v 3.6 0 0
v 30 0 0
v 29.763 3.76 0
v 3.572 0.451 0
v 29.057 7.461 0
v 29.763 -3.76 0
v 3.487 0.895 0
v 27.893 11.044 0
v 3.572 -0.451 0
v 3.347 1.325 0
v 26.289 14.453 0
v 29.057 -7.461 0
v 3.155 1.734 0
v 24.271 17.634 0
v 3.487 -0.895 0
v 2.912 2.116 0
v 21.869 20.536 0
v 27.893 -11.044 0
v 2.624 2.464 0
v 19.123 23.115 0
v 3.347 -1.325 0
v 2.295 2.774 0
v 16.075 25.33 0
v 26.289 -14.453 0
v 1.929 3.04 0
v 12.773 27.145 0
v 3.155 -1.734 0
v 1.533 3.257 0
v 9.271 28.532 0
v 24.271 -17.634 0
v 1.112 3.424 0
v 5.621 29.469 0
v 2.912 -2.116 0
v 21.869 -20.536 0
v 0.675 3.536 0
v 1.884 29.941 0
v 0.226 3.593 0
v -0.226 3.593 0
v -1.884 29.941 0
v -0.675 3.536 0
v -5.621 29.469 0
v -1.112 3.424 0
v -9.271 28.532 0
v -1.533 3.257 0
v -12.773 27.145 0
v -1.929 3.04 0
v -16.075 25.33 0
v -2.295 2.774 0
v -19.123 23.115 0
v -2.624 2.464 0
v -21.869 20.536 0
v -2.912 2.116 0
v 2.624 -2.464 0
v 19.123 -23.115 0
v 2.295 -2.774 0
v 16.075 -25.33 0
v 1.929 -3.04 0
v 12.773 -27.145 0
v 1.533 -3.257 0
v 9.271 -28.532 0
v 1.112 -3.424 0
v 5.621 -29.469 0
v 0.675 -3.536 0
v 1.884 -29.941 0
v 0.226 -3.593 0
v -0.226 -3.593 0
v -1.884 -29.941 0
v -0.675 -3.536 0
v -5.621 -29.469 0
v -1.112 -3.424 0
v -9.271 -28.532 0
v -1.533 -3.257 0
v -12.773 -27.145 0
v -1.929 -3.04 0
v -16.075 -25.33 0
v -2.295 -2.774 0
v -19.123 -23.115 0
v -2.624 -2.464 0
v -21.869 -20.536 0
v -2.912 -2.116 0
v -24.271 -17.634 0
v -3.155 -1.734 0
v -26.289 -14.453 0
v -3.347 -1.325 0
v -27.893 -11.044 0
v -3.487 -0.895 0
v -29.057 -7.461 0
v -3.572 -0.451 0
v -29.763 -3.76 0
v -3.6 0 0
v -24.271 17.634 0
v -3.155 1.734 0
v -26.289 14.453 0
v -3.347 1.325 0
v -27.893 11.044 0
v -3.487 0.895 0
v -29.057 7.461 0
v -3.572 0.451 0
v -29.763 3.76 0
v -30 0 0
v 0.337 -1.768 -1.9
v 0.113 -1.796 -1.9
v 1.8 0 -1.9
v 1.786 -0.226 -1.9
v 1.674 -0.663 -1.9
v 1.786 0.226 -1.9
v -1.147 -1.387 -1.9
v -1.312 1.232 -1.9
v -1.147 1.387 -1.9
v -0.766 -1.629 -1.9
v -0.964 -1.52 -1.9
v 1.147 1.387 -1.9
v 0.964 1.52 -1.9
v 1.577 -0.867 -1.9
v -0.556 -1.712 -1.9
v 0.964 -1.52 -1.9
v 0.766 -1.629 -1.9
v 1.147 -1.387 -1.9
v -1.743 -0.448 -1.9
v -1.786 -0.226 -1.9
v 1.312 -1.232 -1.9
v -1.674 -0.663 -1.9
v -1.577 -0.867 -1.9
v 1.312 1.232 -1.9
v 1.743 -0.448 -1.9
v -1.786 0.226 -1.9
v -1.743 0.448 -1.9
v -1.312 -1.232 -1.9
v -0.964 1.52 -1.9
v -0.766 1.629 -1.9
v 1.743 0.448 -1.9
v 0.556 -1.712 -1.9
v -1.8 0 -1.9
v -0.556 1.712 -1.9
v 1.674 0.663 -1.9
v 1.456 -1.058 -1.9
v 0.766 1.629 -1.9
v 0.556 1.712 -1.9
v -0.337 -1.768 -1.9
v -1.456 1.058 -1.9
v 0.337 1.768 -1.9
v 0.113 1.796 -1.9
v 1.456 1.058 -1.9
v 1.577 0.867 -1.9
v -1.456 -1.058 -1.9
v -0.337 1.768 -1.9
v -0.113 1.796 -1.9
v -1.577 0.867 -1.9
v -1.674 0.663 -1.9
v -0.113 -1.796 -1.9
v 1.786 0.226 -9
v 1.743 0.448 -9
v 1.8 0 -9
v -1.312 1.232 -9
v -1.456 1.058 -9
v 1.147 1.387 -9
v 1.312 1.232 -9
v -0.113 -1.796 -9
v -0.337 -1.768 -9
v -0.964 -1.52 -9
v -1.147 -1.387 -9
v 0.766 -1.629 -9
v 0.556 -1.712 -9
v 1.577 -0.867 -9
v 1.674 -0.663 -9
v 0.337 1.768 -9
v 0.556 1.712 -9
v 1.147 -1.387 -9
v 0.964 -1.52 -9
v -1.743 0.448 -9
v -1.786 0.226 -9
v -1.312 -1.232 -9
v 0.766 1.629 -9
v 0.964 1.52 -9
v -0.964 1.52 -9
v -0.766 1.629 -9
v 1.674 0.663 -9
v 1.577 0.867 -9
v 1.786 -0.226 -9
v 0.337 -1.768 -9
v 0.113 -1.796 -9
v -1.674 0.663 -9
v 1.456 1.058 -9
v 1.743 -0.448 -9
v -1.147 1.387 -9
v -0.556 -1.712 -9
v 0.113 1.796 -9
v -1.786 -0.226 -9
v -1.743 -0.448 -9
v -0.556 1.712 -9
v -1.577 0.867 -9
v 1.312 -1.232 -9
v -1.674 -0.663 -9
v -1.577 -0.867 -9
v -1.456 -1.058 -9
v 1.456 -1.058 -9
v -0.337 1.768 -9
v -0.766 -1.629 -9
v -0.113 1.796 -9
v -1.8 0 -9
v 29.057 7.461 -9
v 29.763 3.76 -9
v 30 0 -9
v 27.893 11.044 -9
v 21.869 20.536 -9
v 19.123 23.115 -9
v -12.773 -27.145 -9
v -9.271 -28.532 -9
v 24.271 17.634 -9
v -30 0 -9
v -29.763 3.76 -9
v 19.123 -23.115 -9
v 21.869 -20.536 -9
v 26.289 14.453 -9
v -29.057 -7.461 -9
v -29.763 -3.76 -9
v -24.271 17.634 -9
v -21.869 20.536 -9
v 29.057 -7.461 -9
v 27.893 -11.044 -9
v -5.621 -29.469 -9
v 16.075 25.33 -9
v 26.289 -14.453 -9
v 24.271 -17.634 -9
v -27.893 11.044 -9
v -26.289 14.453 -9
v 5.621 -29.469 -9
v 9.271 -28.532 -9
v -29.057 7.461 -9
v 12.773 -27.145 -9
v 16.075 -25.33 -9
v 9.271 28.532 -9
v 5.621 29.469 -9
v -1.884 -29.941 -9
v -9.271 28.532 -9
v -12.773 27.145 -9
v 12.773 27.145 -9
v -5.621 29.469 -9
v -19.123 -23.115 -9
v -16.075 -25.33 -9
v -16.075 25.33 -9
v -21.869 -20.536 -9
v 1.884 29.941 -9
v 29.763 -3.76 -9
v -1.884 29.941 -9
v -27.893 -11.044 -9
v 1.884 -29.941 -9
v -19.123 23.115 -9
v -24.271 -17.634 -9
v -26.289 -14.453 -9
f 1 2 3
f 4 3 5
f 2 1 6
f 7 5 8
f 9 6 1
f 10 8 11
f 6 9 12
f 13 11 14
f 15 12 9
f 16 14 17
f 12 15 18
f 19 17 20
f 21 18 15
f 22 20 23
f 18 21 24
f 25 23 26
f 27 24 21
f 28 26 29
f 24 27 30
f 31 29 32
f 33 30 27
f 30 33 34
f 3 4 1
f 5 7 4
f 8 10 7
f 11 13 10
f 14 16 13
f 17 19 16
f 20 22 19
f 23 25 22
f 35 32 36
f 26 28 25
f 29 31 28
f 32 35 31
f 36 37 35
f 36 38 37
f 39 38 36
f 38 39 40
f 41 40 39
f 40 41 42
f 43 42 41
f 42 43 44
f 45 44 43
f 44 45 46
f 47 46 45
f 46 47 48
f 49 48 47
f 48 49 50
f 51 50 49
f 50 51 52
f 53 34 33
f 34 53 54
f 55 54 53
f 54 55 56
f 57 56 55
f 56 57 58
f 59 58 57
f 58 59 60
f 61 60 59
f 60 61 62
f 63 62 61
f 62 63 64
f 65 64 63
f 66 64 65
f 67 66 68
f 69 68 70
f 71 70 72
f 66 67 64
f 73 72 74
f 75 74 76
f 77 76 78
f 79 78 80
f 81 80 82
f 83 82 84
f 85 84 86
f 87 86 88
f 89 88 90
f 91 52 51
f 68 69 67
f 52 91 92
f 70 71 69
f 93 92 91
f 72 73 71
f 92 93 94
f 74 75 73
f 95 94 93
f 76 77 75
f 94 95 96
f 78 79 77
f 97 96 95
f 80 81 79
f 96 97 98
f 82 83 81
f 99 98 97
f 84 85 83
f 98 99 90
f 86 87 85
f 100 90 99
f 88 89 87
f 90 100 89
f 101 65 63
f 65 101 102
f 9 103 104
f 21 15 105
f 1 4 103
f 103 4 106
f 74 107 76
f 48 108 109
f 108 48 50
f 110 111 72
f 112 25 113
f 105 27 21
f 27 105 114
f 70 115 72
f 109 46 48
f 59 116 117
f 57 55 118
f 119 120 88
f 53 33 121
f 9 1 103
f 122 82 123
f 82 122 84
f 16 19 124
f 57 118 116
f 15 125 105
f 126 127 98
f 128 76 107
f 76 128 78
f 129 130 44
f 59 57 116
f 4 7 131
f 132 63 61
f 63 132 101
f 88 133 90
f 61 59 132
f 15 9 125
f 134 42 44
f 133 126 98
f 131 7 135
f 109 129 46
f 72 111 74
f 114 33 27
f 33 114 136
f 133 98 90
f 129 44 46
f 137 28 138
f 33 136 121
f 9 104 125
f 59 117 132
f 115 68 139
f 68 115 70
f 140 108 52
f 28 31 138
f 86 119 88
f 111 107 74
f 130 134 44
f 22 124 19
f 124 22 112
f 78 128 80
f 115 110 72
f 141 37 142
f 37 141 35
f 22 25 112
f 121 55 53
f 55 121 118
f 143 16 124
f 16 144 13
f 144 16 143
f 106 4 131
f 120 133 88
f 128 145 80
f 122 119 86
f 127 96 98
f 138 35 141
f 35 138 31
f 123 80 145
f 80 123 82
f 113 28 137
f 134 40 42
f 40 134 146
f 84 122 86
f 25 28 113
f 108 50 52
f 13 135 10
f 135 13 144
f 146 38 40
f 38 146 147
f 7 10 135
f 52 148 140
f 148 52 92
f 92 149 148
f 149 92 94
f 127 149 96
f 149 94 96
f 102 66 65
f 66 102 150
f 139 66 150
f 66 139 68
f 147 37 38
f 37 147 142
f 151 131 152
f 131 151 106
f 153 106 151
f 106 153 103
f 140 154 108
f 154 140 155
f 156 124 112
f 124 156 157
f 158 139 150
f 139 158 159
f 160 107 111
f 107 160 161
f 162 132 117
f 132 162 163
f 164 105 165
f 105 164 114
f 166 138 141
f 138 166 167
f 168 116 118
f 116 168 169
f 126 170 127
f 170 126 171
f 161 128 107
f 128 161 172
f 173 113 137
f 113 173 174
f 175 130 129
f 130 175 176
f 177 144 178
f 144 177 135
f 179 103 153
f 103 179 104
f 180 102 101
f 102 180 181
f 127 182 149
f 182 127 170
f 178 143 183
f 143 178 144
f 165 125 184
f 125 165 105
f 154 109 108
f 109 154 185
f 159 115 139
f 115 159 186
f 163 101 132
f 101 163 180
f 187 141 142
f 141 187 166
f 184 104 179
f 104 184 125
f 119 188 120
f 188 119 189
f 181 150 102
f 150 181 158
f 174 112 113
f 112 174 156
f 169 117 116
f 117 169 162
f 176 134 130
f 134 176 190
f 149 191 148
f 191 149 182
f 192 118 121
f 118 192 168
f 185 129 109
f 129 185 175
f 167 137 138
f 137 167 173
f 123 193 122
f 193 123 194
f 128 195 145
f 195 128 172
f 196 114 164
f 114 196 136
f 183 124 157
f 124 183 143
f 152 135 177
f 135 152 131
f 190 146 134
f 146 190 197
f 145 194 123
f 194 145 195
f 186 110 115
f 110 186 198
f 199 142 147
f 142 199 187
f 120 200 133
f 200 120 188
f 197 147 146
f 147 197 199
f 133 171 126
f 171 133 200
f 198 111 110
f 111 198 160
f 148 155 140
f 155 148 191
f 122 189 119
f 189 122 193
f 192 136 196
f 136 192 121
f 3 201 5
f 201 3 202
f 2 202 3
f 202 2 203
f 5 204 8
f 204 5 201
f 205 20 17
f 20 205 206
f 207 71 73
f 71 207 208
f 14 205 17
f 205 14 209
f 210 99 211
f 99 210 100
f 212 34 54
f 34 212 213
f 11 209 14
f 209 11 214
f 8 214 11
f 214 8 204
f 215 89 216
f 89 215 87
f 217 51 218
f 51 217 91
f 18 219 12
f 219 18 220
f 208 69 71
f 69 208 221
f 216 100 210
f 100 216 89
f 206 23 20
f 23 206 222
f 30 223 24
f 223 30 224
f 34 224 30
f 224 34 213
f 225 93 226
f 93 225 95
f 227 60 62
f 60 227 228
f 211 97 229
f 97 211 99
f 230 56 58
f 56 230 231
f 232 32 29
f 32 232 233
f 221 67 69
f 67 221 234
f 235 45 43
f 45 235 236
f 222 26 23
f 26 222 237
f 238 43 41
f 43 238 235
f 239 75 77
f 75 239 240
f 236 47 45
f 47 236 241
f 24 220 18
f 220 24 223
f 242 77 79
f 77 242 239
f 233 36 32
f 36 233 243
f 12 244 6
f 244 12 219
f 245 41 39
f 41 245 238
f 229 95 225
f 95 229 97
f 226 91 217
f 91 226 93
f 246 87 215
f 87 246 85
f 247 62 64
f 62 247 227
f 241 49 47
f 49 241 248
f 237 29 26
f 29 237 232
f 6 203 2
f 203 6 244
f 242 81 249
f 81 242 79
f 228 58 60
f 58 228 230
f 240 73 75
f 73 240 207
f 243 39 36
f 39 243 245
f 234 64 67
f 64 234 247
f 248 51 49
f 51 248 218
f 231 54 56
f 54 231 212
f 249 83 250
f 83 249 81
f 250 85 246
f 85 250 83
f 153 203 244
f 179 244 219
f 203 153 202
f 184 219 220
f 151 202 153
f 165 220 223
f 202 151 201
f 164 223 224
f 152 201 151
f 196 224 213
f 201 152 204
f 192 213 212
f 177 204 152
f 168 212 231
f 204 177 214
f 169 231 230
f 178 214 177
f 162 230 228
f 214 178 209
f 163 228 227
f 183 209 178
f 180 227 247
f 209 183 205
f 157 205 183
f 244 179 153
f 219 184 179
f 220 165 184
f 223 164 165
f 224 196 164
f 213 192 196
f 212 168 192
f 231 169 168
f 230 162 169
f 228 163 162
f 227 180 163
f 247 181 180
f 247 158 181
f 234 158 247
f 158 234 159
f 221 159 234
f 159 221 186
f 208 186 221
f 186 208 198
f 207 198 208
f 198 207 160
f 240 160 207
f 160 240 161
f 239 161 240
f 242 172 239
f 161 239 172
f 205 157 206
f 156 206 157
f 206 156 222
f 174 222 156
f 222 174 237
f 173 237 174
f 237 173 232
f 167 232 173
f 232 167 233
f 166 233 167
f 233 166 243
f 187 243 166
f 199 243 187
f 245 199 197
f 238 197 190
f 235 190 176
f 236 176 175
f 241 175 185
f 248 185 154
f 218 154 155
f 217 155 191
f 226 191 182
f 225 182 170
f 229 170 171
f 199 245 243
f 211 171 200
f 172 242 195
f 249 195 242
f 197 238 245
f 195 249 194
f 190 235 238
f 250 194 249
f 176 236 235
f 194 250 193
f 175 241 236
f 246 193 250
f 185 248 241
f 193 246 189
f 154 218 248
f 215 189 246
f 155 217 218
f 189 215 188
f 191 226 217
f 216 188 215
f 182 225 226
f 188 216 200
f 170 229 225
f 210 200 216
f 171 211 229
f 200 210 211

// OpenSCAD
$fn = 50;

difference() {
	union() {
		translate(v = [0, 0, -9.0]) {
			cylinder(h = 9, r = 30.0);
		}
	}
	union() {
		translate(v = [0, 0, 0]) {
			rotate(a = [0, 0, 0]) {
				difference() {
					union() {
						translate(v = [0, 0, -12.0]) {
							cylinder(h = 12, r = 1.5);
						}
						translate(v = [0, 0, -1.9]) {
							cylinder(h = 1.9, r1 = 1.8, r2 = 3.6);
						}
						translate(v = [0, 0, -12.0]) {
							cylinder(h = 12, r = 1.8);
						}
						translate(v = [0, 0, -12.0]) {
							cylinder(h = 12, r = 1.5);
						}
					}
					union();
				}
			}
		}
	}
}
